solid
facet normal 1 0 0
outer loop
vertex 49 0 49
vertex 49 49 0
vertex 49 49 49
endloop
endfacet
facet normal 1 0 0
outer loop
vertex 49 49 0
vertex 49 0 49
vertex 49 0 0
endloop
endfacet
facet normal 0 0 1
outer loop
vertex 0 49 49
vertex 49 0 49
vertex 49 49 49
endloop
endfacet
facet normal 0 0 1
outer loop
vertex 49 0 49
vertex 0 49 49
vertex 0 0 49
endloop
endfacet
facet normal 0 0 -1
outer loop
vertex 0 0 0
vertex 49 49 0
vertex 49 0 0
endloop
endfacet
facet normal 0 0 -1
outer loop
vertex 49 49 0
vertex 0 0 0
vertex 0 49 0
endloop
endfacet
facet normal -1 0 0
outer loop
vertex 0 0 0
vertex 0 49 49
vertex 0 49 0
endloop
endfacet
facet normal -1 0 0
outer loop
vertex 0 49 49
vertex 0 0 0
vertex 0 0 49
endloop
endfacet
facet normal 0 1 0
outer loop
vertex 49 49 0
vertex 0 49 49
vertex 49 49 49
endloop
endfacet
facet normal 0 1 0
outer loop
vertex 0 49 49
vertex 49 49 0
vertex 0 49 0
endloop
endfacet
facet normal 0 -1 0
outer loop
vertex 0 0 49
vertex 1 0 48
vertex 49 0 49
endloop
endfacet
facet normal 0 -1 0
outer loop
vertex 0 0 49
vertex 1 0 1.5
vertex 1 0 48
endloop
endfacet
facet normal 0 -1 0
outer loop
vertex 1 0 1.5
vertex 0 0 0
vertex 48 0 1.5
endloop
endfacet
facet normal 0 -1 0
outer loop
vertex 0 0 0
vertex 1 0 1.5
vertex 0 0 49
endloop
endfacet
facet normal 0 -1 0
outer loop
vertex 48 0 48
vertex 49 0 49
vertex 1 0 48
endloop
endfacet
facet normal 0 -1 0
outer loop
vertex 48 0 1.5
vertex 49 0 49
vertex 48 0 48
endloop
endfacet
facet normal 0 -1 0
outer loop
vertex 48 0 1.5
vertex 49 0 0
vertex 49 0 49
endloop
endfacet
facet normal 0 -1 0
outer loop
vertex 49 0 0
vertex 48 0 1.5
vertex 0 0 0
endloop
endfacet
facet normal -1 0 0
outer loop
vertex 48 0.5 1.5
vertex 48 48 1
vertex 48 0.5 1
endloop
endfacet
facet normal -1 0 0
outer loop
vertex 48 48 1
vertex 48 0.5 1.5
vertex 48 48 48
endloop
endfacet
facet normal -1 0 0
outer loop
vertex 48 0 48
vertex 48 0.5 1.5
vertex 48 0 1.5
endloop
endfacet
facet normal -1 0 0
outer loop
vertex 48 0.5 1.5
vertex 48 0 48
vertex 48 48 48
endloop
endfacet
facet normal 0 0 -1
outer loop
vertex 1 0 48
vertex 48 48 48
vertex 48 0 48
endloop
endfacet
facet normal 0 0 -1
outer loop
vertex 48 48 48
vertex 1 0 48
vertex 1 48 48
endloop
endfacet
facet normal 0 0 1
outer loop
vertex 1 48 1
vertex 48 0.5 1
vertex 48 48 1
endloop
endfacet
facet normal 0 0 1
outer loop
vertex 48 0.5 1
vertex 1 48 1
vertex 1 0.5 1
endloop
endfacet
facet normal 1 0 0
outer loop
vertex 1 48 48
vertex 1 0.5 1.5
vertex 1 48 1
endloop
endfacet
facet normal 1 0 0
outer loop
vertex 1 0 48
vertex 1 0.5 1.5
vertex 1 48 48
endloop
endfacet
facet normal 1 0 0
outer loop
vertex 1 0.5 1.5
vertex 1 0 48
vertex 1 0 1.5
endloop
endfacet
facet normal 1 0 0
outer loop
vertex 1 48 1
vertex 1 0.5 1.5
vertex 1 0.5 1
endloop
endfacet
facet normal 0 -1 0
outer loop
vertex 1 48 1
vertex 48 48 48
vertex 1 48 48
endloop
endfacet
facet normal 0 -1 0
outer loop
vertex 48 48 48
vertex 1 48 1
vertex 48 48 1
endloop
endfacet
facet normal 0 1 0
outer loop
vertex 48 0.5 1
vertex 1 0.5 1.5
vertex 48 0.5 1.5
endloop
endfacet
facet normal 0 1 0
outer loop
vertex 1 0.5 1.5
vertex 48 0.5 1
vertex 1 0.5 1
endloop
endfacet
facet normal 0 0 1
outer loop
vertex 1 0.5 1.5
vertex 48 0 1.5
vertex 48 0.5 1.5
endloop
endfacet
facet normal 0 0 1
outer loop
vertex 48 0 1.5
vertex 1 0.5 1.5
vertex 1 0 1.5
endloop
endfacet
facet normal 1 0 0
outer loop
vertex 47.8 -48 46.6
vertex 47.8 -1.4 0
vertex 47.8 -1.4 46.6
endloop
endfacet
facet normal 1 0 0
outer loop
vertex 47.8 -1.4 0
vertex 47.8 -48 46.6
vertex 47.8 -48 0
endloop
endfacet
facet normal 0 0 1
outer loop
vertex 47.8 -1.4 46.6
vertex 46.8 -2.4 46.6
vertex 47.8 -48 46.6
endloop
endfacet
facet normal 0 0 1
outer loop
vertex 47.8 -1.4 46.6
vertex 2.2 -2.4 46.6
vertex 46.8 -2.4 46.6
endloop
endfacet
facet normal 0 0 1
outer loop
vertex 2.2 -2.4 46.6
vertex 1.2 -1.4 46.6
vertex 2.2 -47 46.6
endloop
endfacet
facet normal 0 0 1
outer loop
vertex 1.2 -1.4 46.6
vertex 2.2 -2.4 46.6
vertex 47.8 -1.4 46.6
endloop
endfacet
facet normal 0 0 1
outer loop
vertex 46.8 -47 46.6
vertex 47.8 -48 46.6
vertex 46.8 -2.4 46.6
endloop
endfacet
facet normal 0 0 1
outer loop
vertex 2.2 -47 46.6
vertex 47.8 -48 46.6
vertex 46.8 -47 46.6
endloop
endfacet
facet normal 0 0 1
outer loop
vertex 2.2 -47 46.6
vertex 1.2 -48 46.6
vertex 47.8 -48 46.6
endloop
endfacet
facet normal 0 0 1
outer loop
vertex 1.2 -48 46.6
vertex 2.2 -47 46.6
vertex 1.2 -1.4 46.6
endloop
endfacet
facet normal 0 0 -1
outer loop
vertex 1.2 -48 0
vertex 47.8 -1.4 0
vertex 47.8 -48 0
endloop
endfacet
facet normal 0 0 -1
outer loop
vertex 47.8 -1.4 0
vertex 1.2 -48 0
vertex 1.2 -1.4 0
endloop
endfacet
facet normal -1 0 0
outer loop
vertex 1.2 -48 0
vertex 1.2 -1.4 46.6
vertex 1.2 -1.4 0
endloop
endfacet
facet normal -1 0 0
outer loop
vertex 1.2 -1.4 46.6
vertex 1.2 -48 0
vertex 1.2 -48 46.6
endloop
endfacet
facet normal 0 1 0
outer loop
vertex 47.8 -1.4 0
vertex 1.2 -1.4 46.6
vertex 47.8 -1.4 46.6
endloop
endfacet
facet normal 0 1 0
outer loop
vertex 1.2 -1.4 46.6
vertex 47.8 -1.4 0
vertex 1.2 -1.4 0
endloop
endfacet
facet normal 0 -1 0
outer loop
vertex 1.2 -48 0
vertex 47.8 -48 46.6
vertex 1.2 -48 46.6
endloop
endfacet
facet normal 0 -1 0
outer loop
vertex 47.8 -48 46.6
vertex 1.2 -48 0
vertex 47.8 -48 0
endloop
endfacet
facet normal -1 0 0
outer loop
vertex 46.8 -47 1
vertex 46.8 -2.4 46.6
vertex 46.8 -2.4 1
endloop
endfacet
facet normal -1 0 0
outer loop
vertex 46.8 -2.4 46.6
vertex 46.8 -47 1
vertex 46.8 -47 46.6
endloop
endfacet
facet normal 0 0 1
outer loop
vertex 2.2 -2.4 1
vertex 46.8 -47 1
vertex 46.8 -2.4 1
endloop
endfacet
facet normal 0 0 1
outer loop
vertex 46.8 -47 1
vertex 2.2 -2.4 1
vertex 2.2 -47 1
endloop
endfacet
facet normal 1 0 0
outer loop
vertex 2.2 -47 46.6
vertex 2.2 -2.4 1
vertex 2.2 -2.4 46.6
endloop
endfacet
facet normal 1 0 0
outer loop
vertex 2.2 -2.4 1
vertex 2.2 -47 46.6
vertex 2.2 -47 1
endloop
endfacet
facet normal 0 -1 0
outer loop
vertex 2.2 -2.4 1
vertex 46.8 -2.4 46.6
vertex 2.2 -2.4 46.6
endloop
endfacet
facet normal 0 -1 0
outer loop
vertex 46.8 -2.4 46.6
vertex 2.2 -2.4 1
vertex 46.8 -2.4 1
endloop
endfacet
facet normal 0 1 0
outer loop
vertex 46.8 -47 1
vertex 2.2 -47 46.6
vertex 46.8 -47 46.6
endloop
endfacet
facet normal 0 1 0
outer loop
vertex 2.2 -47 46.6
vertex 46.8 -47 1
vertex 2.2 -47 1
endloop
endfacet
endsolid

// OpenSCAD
module cell(w,h,d,c,c1) {
  difference() {
    cube([w,h,d]);
    translate([c,c1,c]) cube([w-2*c,h-c-c1,d-2*c]);
    translate([c,-.1,c+c1]) cube([w-2*c,h-c-.1,d-2*c-c1]);
  }
}

module box(w,h,d,c) {
  difference() {
    cube([w,h,d]);
    translate([c,c,c]) cube([w-2*c,h-2*c,d-c+.1]);
  }
}

w = 49;
h = 49;
d = 49;
c = 1;
c1 = .5;
s = .2;

cell(w,h,d,c,c1);

translate([c+s,-h+c,0]) box(w-2*c-2*s,w-2*c-2*s,w-2*c-2*s,c);
